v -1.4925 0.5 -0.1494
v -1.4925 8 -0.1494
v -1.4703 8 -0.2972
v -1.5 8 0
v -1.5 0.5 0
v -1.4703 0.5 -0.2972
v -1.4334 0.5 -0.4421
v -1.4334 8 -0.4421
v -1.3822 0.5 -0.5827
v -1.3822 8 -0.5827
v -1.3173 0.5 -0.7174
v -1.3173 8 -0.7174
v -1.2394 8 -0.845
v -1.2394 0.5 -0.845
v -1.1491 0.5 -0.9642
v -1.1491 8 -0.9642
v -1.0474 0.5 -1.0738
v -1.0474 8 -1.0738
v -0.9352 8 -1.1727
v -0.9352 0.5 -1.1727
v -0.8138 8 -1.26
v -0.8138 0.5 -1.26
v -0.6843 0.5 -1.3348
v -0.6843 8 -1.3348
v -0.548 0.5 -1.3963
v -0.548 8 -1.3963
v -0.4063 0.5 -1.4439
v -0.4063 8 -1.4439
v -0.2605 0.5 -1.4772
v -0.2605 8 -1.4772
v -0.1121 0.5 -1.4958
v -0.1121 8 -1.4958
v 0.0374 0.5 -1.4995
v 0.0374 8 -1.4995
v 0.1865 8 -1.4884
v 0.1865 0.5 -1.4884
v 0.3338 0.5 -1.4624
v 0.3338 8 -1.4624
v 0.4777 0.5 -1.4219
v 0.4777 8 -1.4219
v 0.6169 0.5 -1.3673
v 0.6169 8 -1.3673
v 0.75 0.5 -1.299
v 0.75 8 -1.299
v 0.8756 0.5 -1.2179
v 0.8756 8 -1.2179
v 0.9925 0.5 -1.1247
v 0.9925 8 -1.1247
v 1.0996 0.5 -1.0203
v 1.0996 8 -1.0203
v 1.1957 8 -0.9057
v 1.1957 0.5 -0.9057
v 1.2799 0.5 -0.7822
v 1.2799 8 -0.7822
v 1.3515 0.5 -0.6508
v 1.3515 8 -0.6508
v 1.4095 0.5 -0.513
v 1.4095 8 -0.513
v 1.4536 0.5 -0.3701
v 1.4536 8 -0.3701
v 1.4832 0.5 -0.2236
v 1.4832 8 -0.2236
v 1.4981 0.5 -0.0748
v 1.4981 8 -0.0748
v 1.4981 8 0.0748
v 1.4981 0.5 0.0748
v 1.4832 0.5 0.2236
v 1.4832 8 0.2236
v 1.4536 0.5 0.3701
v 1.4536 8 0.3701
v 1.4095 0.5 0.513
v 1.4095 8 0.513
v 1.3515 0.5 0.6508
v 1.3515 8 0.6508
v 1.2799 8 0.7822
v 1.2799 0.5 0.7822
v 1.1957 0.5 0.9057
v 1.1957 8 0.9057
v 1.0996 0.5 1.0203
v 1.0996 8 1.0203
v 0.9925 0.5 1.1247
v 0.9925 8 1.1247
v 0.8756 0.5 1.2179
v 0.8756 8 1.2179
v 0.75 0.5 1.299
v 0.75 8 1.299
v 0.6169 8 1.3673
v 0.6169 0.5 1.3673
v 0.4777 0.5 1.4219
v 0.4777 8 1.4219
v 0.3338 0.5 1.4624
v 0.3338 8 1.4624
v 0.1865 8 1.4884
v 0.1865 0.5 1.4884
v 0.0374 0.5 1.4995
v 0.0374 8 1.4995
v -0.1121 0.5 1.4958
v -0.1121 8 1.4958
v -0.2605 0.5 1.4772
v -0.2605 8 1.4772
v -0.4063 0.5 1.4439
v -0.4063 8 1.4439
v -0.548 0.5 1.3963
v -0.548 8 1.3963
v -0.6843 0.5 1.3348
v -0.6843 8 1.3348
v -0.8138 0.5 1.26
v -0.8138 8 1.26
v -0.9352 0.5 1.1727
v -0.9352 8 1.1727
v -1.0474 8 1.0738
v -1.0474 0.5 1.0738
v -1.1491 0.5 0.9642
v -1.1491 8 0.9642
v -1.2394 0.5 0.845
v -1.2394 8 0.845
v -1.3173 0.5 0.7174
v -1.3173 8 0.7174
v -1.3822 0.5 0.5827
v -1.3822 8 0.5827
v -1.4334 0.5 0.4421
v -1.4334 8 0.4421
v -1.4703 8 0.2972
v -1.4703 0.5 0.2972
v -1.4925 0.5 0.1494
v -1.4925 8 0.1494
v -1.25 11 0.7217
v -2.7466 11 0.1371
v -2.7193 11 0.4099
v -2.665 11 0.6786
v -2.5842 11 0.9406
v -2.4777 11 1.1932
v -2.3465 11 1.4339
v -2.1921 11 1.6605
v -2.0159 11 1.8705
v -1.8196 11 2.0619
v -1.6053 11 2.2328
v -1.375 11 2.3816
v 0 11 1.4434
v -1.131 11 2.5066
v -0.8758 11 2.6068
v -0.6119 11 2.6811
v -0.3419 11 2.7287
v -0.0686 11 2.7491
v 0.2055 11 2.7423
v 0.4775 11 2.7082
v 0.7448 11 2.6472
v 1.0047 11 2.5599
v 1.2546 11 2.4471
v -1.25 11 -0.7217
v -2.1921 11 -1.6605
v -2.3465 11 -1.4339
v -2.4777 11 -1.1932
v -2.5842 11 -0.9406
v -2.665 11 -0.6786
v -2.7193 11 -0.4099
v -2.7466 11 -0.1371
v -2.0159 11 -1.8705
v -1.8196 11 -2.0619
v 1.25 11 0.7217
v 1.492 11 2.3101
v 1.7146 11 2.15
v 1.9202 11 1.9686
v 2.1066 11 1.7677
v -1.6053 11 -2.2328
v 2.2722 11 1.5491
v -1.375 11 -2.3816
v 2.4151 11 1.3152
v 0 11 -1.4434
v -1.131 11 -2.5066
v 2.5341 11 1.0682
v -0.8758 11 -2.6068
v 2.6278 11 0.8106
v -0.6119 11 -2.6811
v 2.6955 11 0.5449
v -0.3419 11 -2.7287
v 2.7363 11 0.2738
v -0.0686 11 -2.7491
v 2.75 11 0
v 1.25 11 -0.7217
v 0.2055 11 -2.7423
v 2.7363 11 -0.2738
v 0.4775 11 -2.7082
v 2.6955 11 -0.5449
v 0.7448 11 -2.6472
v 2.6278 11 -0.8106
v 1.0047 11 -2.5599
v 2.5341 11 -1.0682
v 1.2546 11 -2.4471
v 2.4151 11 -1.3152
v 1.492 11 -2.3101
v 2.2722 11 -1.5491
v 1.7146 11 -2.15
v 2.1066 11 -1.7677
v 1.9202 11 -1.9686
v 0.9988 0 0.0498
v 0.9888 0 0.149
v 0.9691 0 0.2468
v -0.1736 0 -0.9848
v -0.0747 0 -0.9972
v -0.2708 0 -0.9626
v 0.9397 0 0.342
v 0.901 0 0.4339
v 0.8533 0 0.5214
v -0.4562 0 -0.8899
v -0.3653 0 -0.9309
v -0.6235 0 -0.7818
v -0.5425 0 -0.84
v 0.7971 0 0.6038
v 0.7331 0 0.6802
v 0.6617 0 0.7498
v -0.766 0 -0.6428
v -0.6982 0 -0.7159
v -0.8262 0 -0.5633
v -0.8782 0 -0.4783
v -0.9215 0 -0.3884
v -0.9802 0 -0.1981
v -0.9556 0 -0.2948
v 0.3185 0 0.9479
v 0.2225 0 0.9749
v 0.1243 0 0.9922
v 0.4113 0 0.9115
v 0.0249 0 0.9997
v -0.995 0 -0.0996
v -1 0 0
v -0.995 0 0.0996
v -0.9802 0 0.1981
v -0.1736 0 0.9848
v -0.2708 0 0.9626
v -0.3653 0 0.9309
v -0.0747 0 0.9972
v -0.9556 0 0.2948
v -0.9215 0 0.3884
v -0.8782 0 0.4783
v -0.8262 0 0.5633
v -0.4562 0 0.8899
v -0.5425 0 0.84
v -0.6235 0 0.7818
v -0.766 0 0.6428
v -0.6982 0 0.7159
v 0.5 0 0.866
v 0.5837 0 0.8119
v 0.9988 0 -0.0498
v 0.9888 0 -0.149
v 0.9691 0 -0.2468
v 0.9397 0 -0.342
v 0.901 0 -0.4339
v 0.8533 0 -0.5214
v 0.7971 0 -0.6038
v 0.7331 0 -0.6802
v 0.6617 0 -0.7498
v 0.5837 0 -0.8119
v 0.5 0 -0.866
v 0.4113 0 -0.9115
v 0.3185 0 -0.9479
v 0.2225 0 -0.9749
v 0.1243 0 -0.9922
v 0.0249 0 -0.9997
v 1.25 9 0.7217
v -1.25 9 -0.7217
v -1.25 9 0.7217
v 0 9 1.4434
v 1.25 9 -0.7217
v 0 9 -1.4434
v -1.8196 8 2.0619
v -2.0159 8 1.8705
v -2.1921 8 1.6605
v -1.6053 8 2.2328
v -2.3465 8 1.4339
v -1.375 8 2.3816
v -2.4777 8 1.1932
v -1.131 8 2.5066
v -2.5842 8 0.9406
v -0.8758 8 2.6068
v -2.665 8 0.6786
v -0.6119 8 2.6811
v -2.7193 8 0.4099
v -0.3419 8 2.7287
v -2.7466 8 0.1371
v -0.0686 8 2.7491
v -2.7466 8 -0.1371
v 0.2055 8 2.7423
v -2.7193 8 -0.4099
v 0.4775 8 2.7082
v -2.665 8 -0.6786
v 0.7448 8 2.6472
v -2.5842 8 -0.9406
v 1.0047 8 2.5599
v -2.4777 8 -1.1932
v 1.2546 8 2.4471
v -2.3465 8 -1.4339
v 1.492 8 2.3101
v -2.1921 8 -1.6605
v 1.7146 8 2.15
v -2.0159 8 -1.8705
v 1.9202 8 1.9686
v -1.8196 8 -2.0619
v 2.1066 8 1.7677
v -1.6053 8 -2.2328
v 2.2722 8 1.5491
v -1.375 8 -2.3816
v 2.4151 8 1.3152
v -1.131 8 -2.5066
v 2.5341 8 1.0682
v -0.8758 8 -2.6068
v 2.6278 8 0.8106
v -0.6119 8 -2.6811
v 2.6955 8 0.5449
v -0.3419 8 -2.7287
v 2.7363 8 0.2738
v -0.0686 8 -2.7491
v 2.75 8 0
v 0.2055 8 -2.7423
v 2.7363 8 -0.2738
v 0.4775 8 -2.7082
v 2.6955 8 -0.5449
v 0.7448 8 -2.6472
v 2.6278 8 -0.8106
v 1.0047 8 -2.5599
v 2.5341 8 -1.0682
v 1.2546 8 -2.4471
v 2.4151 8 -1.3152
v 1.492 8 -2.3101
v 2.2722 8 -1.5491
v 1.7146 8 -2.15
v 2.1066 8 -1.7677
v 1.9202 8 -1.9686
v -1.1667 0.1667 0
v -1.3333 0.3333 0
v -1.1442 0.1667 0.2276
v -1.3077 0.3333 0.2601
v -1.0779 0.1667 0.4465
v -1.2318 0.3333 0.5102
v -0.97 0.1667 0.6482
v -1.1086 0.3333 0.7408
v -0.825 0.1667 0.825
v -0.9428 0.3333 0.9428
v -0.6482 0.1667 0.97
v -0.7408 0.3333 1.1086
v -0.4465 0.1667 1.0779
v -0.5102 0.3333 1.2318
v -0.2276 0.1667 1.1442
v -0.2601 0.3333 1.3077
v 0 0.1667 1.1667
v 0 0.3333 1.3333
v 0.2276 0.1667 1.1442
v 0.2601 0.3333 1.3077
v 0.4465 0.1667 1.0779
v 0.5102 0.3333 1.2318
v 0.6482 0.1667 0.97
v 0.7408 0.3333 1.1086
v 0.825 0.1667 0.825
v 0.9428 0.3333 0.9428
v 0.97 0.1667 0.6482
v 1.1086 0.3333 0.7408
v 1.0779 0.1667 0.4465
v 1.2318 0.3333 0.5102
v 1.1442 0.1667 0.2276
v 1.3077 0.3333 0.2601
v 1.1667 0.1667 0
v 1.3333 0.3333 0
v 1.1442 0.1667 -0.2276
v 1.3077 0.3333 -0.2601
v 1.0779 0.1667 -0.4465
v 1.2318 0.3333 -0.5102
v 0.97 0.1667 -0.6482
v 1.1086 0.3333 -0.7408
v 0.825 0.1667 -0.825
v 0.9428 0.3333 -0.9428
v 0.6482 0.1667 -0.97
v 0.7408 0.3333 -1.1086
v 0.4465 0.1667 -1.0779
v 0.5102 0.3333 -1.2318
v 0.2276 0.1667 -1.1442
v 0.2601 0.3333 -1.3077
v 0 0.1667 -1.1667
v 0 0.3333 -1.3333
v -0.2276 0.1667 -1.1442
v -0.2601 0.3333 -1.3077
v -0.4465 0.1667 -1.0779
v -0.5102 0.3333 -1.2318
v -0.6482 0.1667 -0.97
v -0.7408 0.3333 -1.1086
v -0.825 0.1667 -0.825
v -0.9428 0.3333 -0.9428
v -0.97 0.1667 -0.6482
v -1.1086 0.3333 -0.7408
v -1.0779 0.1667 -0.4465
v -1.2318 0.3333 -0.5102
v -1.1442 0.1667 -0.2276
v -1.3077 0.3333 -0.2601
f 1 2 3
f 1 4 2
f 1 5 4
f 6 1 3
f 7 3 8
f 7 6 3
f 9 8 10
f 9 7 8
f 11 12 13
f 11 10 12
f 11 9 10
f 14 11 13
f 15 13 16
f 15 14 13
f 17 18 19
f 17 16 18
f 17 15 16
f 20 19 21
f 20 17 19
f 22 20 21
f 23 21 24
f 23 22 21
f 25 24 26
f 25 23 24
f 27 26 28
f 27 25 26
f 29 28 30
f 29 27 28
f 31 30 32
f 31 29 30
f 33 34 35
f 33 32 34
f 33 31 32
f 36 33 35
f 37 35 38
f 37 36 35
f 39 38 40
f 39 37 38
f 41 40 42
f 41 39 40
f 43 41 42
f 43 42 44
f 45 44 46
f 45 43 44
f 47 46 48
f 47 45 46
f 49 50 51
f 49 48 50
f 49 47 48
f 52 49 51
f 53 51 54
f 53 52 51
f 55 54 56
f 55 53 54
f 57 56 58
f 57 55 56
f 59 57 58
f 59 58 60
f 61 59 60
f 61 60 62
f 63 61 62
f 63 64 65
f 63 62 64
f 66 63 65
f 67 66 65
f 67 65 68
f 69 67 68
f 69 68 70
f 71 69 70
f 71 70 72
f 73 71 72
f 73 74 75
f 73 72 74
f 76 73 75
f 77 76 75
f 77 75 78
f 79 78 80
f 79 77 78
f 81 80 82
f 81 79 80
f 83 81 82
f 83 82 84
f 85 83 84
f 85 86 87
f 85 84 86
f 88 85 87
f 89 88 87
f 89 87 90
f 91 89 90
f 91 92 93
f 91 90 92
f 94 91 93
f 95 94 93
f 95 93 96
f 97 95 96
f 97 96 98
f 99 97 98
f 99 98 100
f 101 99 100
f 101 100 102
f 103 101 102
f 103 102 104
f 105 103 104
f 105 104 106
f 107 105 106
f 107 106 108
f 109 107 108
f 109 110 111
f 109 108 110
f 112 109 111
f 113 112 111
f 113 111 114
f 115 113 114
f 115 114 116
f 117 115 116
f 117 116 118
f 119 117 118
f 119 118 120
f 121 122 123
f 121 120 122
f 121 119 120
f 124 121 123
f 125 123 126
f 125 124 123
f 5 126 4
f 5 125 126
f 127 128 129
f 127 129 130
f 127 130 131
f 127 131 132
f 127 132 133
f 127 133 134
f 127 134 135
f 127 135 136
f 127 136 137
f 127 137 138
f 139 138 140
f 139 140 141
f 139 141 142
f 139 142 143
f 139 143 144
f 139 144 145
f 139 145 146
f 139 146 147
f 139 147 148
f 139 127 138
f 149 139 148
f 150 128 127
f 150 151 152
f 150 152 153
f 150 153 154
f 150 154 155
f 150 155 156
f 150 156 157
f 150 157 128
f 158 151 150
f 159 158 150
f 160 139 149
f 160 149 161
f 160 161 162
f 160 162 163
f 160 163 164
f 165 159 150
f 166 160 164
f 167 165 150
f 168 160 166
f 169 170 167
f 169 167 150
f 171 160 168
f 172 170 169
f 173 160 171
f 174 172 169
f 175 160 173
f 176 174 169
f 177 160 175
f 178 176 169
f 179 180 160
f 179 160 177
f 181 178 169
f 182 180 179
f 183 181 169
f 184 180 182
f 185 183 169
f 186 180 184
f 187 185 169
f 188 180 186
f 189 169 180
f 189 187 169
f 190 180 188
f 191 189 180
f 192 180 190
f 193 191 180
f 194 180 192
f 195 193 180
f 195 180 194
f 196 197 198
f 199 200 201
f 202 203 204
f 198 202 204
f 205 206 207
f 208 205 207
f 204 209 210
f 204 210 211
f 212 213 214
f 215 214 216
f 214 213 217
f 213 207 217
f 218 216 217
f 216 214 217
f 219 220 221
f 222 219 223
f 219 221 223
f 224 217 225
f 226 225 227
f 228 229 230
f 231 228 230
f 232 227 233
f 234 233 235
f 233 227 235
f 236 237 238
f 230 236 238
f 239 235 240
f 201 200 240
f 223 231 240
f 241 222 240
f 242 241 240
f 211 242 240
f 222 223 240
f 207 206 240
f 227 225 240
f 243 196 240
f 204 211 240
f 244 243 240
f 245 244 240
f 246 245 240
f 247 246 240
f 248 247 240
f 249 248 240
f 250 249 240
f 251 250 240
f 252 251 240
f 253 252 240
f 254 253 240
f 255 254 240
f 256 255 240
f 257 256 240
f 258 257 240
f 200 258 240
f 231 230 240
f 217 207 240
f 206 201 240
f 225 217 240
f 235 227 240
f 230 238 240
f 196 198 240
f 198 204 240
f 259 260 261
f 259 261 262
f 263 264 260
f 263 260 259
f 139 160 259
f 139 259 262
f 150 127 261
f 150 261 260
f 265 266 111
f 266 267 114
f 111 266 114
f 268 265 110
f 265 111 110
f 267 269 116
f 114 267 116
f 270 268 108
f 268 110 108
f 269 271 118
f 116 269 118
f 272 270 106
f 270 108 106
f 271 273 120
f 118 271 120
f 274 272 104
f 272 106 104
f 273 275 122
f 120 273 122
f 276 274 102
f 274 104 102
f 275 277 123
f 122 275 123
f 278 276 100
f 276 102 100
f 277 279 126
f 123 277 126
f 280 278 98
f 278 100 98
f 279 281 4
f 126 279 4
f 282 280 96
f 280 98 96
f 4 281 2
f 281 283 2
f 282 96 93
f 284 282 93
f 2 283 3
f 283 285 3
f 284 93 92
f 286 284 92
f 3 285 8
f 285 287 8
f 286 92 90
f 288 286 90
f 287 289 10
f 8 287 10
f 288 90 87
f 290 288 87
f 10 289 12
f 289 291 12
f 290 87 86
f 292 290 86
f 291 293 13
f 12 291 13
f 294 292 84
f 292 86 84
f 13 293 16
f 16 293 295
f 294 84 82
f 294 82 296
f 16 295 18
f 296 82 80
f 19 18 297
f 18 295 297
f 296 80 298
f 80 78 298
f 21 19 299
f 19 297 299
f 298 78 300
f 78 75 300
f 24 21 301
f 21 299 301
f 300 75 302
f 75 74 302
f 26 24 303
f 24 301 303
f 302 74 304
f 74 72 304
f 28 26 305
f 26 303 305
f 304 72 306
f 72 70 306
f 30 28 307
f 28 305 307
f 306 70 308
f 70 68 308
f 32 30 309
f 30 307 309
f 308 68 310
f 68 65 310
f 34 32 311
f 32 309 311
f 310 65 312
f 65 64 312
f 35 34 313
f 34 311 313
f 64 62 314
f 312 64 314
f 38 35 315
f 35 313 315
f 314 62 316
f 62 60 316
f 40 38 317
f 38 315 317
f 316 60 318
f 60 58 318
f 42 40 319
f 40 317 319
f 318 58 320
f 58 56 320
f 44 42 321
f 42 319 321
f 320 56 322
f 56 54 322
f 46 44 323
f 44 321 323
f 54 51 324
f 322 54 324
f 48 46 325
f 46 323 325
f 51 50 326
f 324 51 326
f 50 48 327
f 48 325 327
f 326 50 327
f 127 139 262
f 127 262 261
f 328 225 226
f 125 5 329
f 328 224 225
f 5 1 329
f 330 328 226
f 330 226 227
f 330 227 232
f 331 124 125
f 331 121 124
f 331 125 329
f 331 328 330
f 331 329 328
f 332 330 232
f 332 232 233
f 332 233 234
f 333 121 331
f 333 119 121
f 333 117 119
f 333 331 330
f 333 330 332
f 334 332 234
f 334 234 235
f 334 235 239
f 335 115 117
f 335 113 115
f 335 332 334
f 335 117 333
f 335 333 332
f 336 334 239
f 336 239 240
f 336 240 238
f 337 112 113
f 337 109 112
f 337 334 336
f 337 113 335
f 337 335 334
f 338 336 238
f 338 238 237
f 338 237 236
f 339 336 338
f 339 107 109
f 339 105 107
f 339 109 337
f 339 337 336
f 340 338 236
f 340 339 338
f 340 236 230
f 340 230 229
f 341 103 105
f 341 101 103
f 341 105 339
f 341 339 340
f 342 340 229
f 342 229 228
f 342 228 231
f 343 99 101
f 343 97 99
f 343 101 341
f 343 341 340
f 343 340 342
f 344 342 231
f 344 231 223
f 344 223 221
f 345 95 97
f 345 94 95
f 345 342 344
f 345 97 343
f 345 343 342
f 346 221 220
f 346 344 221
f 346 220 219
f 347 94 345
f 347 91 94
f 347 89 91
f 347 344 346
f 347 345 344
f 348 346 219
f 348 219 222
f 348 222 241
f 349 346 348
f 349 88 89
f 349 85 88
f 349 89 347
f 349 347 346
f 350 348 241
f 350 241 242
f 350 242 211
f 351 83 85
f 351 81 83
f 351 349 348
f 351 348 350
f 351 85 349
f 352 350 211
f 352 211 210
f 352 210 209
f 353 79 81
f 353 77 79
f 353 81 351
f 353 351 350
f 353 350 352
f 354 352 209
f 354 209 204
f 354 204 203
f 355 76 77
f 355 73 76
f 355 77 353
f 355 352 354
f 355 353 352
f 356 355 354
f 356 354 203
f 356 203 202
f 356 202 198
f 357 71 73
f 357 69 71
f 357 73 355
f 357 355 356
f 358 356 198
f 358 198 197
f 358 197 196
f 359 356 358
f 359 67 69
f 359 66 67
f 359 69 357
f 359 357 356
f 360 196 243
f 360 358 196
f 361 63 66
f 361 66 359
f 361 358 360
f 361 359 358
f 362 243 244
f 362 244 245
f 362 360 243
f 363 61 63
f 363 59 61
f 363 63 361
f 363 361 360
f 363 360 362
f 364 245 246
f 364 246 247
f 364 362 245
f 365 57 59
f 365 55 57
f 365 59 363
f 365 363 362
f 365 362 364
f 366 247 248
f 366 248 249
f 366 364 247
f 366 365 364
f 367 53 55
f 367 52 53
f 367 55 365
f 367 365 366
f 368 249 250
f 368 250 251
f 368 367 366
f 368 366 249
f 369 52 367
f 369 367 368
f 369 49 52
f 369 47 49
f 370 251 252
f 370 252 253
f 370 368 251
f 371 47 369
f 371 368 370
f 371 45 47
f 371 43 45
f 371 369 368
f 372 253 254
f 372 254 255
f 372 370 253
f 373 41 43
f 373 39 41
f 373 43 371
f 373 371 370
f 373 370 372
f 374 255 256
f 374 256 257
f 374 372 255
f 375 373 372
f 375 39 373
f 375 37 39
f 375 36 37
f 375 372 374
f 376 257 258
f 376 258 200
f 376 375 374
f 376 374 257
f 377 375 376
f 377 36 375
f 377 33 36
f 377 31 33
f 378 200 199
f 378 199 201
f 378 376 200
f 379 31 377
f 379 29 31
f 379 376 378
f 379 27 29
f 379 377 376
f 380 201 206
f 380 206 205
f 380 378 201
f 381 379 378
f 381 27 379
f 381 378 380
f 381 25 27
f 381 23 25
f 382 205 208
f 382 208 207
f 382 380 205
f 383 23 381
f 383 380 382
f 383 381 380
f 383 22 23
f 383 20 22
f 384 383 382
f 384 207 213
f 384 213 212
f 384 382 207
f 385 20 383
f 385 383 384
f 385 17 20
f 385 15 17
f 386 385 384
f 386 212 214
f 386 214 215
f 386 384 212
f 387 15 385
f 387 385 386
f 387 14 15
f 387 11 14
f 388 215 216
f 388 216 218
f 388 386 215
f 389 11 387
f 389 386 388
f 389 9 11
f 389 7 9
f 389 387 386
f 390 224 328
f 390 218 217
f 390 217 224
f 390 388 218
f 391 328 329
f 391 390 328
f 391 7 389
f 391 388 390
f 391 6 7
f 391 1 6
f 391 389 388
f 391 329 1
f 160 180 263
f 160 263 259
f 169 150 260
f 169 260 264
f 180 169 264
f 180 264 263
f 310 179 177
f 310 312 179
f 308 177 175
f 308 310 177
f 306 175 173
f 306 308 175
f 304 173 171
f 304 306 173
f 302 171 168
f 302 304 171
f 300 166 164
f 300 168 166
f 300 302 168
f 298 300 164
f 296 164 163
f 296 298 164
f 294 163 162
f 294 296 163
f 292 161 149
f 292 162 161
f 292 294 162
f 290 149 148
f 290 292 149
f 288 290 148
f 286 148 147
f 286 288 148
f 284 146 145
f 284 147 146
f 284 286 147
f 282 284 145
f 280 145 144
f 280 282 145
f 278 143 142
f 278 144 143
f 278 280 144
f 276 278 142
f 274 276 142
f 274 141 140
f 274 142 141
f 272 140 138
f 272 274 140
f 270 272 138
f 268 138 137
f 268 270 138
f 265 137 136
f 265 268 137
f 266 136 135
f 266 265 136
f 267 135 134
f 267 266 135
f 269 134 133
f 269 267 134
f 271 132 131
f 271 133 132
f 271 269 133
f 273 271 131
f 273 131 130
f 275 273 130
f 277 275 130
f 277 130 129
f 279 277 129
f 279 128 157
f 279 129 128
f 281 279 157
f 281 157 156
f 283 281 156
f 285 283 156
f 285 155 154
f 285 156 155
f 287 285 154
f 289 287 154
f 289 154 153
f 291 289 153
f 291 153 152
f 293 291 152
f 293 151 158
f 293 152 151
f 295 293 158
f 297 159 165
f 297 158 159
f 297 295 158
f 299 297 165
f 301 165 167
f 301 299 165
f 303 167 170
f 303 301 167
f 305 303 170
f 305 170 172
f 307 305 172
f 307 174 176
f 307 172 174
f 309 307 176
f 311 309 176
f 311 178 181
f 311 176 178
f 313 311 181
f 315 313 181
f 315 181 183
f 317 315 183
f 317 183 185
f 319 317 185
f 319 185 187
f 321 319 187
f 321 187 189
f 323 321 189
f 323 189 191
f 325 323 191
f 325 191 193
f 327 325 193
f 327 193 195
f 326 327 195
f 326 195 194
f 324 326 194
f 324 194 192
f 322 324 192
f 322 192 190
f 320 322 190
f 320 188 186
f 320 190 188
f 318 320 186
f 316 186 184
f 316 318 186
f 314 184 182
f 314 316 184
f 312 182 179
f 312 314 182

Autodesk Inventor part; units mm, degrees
ref_plane "YZ Plane" through (0, 0, 0) normal (1, 0, 0) x (0, 1, 0)
ref_plane "XZ Plane" through (0, 0, 0) normal (0, 1, 0) x (-1, 0, 0)
ref_plane "XY Plane" through (0, 0, 0) normal (0, 0, 1) x (1, 0, 0)
sketch "Sketch1" plane through (0, 0, 0) normal (0, 1, 0) x (-1, 0, 0)
  circle A0 centre (0, 0) radius 1.5
  dimension "d0" = 3
extrude "Extrusion1" add sketch "Sketch1" along normal blind 8
sketch "Sketch2" plane through (0, 8, 0) normal (0, 1, 0) x (1, 0, 0)
  circle A0 centre (0, 0) radius 1.5 projected
  circle A1 centre (0, 0) radius 2.75
  dimension "d3" = 5.5
extrude "Extrusion2" add sketch "Sketch2" along normal blind 3 contours A0 | A1
sketch "Sketch3" plane through (0, 11, 0) normal (0, 1, 0) x (1, 0, 0)
  circle A0 centre (0, 0) radius 2.75 projected
  line L0 (0, 1.4434) -> (1.25, 0.7217)
  line L1 (1.25, 0.7217) -> (1.25, -0.7217)
  line L2 (1.25, -0.7217) -> (0, -1.4434)
  line L3 (0, -1.4434) -> (-1.25, -0.7217)
  line L4 (-1.25, -0.7217) -> (-1.25, 0.7217)
  line L5 (-1.25, 0.7217) -> (0, 1.4434)
  dimension "d6" = 2.5
extrude "Extrusion3" cut sketch "Sketch3" against normal blind 2 contours L0 L1 L2 L3 L4 L5
thread "Thread1" size "M3x0.5" class "6g" standard "ANSI Metric M Profile" full length
chamfer "Chamfer1" distance 0.5 angle 45 1 edges at (1.5, 0, 0)
properties part number "SHCS3x8" material "Stainless Steel"
